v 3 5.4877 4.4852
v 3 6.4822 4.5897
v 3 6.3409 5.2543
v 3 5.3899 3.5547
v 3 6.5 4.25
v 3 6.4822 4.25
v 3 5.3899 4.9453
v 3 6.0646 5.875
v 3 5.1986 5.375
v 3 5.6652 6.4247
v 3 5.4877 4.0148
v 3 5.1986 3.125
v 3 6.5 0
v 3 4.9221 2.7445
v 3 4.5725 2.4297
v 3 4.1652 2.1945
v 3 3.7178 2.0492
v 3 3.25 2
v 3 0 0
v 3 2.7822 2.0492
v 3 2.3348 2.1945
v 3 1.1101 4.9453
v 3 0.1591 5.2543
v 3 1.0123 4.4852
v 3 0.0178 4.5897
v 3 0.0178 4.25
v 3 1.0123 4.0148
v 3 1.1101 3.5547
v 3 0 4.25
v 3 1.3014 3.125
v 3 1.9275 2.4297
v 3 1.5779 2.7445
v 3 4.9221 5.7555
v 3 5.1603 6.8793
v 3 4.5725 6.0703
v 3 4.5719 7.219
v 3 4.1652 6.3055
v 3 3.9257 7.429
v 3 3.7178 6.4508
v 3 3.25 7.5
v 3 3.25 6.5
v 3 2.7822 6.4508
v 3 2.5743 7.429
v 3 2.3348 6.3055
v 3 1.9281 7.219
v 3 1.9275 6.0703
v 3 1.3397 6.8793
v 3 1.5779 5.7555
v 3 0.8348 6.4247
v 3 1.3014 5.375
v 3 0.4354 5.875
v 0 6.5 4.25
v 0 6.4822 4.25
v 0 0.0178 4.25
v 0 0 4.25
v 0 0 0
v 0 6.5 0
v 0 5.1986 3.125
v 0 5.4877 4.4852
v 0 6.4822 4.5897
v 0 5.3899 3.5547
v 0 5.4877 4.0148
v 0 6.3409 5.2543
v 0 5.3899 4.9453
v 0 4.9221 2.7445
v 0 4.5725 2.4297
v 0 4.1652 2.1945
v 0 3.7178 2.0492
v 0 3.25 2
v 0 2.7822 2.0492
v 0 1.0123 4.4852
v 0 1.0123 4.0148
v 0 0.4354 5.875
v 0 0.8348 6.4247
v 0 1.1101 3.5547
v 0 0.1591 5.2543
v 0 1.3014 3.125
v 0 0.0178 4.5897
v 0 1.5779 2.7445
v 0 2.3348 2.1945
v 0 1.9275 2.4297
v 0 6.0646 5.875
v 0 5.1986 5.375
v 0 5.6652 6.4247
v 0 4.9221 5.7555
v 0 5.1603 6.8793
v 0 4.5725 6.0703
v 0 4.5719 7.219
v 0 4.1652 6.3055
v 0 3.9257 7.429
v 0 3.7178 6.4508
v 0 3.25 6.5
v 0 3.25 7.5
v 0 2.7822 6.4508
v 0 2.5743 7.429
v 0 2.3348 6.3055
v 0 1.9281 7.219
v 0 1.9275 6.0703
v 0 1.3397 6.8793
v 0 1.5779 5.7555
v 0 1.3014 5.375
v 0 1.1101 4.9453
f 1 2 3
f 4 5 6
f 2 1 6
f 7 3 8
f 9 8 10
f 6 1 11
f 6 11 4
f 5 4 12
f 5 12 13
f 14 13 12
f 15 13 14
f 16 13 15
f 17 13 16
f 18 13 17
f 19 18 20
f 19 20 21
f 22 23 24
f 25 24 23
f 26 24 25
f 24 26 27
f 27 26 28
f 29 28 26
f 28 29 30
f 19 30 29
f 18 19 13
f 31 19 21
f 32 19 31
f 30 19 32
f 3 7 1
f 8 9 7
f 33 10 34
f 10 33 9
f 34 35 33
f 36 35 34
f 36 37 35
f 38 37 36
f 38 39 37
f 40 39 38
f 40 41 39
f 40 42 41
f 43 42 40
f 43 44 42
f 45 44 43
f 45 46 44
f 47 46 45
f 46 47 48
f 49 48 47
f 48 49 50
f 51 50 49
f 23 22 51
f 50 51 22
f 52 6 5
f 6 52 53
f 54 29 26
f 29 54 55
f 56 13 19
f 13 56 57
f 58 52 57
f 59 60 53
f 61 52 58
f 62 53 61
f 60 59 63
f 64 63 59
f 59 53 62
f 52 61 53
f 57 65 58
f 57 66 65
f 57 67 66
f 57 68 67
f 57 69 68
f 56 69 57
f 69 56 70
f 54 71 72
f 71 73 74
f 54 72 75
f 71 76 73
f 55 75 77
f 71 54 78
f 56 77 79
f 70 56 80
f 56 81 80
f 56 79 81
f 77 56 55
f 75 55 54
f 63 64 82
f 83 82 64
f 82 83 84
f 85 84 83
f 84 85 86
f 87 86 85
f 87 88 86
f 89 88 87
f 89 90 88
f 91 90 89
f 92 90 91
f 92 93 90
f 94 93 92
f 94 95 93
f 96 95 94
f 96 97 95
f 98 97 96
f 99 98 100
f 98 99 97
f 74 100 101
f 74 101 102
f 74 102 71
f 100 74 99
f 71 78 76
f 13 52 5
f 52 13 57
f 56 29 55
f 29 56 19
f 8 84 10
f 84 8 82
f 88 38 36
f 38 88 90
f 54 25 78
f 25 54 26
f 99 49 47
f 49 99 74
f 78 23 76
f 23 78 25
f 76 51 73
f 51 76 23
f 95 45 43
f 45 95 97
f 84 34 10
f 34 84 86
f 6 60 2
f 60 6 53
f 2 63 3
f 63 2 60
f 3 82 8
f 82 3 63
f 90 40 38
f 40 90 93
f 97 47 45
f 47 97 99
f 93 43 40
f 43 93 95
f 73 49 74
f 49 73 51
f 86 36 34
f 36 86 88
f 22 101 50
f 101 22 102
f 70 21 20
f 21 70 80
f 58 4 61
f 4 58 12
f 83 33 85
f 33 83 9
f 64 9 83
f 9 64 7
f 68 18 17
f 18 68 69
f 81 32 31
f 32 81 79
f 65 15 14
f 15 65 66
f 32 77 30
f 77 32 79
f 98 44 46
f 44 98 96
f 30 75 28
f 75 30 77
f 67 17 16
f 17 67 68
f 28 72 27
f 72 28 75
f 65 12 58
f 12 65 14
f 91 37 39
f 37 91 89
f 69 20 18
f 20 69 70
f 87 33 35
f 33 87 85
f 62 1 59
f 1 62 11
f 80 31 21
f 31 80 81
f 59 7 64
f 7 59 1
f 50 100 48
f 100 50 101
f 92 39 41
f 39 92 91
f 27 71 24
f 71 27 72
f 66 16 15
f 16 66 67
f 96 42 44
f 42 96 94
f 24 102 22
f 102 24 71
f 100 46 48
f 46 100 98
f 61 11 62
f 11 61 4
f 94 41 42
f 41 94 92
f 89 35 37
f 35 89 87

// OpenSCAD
module joint(groundSpacing)
{
  hch = groundSpacing + 6.5/2;  // hole center height

  difference()
  {
    // main element
    union()
    {
      cube([3, 6.5, hch]);
      translate([0, 6.5/2, hch])
        rotate([0, 90, 0])
          cylinder(r=6.5/2, h=3, $fs=0.01);
    }
    // screw hole
    translate([-1, 6.5/2, hch])
      rotate([0, 90, 0])
        cylinder(r=4.5/2, h=3+2*1, $fs=0.01);
  }
}


joint(1);
